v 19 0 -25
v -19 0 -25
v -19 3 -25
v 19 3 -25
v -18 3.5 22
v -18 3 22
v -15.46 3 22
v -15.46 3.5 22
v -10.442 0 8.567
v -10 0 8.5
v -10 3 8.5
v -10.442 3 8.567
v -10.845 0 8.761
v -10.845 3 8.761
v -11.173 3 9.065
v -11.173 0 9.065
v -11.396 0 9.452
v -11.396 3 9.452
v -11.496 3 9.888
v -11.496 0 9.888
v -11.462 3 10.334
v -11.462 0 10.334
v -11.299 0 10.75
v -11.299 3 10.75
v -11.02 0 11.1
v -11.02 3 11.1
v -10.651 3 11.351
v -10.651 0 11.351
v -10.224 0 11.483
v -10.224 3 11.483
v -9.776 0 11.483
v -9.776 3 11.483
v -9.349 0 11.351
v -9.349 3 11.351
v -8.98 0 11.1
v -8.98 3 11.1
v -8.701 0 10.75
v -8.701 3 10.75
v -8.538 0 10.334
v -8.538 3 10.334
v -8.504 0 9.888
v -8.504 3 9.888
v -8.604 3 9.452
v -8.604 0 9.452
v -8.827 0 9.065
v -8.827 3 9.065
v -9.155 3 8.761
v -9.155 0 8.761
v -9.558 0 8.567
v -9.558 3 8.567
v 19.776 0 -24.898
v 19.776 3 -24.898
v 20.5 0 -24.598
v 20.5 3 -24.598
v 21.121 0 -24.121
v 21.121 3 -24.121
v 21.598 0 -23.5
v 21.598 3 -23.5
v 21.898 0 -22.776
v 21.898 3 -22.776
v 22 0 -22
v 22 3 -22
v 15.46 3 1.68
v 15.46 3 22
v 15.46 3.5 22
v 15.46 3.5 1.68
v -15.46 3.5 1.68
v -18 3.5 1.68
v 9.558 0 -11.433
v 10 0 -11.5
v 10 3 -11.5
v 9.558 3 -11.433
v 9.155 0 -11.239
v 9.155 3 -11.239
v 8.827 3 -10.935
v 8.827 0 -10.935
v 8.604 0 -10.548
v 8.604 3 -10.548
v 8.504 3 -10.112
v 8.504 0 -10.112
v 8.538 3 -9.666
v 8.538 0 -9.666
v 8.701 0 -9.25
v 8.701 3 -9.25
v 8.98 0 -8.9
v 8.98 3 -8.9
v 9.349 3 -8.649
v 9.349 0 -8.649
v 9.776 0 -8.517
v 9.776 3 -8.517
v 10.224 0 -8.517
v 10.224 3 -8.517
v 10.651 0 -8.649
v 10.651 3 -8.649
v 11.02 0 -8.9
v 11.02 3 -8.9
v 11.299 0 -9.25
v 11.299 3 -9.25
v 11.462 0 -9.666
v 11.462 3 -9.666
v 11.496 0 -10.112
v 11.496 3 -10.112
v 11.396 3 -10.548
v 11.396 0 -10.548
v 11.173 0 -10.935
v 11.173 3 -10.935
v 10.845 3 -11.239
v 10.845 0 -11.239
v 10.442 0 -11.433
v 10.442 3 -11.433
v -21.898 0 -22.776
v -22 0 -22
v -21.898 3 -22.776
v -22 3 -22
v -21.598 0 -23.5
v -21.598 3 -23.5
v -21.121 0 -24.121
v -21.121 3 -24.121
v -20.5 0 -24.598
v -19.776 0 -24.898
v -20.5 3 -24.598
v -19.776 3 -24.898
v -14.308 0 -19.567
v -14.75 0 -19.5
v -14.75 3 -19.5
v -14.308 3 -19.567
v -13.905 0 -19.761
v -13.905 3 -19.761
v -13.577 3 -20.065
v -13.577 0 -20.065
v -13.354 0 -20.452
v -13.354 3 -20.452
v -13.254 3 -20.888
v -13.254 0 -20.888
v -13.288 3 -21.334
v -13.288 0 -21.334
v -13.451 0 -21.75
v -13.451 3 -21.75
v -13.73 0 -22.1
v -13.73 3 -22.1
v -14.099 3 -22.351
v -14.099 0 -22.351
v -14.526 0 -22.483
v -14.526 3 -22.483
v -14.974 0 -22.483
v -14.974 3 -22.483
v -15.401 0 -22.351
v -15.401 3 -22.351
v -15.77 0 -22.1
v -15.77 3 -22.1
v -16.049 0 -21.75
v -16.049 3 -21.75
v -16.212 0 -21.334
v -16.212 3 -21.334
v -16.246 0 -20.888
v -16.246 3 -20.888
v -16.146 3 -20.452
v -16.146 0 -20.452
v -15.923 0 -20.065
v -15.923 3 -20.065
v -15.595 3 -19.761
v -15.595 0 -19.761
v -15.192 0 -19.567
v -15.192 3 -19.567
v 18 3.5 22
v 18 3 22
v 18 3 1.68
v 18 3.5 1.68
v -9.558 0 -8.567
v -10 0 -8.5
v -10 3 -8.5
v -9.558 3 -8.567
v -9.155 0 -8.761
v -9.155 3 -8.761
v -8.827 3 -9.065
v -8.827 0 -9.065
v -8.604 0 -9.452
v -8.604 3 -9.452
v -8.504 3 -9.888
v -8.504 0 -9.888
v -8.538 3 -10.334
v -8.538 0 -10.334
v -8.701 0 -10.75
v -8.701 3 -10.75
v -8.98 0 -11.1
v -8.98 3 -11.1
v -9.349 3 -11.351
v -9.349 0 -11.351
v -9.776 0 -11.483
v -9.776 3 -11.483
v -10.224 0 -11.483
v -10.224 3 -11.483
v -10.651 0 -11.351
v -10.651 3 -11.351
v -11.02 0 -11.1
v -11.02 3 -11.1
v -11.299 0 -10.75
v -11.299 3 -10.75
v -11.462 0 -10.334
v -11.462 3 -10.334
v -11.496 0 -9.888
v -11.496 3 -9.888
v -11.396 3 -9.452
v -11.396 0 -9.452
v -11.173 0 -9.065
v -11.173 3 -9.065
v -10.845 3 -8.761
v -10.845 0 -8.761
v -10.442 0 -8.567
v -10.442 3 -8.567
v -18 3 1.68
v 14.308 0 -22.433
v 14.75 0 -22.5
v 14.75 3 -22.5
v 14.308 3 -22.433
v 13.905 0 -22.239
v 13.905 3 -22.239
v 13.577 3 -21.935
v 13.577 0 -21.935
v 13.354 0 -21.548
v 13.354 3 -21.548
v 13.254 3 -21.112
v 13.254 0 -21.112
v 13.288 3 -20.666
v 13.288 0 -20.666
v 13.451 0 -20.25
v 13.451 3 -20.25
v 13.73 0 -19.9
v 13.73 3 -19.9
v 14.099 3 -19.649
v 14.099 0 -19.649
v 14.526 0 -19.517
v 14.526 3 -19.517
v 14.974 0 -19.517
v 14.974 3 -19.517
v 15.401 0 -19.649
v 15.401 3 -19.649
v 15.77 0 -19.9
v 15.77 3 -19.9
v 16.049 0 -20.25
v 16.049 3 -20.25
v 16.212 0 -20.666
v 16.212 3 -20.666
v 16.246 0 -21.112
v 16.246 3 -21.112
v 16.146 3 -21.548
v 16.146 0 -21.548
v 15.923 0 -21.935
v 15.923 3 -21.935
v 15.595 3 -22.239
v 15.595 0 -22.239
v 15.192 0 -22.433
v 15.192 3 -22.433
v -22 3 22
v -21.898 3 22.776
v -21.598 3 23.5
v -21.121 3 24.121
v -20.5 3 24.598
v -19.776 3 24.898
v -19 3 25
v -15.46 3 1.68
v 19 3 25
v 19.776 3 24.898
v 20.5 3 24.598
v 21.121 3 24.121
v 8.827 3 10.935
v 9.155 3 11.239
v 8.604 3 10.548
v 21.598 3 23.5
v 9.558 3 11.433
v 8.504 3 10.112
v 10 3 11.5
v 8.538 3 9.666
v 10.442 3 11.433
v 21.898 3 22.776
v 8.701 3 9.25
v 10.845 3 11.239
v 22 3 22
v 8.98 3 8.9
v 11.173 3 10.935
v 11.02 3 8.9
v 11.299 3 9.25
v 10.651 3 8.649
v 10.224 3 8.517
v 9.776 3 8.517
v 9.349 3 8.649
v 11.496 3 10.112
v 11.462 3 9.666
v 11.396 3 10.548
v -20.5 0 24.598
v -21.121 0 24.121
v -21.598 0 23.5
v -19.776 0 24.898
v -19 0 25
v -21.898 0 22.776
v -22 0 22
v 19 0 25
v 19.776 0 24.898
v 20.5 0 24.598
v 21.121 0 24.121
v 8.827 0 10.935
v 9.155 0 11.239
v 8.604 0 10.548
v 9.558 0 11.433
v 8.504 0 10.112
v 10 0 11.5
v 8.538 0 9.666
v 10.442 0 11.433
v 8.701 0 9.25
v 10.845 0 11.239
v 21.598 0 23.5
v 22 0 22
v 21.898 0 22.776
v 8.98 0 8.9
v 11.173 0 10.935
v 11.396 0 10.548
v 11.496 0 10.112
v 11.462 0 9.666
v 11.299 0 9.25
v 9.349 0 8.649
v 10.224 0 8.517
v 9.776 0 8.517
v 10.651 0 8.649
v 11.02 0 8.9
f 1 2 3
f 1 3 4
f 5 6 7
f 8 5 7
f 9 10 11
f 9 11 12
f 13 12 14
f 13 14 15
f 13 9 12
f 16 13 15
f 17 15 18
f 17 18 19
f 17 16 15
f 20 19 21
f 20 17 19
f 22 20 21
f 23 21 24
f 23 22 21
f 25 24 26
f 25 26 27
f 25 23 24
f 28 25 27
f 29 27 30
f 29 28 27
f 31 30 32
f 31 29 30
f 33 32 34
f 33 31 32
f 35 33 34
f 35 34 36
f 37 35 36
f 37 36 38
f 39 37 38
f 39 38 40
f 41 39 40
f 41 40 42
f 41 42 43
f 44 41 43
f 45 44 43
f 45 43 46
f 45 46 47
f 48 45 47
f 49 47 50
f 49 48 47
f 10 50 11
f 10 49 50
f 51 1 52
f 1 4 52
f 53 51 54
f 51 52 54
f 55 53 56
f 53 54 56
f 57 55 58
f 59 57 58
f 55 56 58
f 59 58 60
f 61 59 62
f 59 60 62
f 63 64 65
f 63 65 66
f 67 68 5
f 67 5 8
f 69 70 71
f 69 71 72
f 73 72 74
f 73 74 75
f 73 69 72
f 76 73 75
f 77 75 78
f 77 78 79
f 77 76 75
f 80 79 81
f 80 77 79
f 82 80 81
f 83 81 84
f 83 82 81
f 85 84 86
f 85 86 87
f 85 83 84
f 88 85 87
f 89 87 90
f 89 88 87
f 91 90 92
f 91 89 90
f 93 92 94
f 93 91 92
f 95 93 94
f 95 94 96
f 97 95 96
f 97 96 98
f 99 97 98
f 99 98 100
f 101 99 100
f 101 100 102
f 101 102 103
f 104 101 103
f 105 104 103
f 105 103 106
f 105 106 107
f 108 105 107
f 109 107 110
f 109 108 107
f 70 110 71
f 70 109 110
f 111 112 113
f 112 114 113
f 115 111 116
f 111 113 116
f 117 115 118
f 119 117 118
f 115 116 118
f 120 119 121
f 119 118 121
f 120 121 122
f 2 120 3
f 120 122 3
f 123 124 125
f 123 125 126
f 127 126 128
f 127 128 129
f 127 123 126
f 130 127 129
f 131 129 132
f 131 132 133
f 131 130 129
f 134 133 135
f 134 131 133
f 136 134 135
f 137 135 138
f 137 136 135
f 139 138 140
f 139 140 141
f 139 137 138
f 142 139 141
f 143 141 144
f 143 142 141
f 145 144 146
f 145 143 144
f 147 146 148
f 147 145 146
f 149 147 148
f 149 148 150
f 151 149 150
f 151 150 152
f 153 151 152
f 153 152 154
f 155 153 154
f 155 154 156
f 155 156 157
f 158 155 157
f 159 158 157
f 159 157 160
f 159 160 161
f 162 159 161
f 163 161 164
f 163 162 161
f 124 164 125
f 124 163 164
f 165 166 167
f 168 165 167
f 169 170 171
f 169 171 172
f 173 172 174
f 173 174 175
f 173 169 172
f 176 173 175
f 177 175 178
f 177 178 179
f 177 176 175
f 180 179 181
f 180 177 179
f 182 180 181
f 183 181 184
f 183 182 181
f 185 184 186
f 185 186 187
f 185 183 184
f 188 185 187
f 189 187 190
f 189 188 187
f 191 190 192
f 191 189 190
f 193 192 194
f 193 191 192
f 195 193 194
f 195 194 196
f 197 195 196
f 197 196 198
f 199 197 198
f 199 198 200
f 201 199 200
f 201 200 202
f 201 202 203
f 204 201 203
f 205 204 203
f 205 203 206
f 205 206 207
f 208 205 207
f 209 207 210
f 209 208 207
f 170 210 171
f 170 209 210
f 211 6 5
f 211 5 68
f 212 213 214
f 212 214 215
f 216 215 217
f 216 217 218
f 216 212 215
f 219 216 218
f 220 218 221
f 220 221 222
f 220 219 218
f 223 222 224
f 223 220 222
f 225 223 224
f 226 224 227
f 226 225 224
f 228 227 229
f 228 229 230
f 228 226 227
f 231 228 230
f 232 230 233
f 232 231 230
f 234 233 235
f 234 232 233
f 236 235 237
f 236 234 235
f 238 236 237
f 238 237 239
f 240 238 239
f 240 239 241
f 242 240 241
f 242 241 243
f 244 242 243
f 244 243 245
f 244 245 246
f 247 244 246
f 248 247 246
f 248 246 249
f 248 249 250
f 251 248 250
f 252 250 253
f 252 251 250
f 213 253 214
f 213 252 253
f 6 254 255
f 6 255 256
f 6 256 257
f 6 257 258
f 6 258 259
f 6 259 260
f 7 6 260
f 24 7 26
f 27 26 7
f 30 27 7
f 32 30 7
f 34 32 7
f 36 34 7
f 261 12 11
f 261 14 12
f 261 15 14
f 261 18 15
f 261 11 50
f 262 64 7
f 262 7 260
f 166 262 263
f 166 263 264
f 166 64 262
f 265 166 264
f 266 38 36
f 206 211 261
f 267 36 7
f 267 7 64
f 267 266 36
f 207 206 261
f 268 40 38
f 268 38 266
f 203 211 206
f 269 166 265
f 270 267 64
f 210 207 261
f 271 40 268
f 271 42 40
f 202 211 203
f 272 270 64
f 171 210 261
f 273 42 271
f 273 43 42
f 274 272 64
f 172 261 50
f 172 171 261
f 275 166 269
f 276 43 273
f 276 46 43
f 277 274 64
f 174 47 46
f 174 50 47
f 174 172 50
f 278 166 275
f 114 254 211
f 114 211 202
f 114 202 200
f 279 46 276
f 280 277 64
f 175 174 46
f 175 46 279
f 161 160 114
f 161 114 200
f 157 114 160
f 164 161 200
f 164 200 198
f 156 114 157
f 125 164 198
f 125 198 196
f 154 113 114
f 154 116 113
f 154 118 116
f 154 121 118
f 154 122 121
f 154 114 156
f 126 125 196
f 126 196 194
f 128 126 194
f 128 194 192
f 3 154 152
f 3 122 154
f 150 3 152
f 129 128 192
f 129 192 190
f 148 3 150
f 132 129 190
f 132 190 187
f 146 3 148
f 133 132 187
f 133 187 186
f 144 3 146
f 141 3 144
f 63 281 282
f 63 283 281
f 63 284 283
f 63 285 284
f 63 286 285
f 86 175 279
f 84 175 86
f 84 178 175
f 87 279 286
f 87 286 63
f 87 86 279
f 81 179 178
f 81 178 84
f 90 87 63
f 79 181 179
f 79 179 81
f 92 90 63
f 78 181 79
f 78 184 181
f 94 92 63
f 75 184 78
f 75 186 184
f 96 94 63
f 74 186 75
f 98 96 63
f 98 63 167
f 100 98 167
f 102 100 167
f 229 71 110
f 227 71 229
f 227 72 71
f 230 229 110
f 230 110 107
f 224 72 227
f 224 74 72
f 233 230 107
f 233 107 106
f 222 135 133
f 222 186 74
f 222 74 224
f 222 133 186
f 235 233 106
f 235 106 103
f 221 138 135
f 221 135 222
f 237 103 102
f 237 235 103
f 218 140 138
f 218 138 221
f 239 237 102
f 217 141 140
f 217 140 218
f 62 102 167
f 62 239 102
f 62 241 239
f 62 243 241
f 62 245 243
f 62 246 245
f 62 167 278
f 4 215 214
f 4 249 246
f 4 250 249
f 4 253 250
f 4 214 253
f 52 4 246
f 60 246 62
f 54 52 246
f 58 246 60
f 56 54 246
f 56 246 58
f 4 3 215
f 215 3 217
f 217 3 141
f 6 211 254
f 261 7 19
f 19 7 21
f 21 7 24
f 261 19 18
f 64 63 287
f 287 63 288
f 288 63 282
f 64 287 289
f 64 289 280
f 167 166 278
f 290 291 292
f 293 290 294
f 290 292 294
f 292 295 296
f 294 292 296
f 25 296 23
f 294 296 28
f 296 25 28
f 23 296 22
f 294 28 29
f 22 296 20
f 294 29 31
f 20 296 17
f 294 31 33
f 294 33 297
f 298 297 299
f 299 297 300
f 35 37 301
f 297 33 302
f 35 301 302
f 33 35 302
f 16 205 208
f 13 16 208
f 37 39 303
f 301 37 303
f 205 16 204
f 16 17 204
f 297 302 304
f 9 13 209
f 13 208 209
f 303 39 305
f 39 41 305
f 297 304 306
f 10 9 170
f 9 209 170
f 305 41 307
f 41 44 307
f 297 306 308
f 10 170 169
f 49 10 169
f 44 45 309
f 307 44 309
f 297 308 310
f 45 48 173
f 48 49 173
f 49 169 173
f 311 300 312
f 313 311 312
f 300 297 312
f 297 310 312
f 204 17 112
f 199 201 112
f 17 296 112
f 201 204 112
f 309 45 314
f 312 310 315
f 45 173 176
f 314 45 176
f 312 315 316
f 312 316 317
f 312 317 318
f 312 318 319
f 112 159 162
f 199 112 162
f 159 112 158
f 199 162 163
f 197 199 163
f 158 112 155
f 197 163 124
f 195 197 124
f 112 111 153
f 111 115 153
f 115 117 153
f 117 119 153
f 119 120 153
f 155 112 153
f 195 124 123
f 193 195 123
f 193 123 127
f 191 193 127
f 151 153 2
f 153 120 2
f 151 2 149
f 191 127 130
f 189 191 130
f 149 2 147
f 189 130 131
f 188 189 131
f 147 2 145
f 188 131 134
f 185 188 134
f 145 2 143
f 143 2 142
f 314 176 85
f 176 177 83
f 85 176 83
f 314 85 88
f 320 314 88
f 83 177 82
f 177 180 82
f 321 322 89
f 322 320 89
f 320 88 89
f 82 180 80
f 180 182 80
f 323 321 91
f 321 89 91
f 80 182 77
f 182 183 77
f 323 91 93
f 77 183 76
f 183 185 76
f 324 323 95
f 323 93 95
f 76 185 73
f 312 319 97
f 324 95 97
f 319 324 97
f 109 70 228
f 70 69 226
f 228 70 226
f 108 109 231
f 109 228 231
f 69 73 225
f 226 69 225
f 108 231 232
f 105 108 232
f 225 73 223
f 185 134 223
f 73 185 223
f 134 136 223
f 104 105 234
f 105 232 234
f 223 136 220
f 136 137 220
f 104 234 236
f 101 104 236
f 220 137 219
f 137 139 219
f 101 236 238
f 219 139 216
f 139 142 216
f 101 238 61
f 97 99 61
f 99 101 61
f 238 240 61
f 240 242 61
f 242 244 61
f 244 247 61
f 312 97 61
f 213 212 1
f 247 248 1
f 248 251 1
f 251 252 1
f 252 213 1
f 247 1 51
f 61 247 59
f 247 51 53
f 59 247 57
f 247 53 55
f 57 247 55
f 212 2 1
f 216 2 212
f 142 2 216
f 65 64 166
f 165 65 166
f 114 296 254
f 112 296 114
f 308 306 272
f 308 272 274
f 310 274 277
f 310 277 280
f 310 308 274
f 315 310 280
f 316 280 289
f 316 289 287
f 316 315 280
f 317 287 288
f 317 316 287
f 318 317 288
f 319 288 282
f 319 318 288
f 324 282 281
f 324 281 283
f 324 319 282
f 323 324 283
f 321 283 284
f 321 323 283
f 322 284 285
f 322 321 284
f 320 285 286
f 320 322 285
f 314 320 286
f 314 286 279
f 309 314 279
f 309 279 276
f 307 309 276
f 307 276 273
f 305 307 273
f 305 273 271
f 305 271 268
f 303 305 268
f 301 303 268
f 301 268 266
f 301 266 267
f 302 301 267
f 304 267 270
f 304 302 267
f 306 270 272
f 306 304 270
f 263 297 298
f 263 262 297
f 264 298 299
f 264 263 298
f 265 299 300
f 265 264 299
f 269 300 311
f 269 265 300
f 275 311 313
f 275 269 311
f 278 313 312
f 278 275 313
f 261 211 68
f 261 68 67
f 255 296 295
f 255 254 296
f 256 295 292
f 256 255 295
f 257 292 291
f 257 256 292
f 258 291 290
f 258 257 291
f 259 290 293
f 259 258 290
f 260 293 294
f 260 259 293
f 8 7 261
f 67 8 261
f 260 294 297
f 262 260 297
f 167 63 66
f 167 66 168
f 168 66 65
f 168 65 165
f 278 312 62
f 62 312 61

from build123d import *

# Parameters (mm, degrees)
SKETCH_1_W      = 44
SKETCH_1_H      = 50
SKETCH_1_R      = 1.5
EXTRUDE_1_DEPTH = 3
FILLET_1_R      = 3
SKETCH_2_W      = 2.54
SKETCH_2_H      = 20.32
EXTRUDE_2_DEPTH = 0.5


with BuildPart() as part:
    # 草图1 → 凸台-拉伸1 (new body)
    with BuildSketch(Plane(origin=(0, 0, 0), x_dir=(1, 0, 0), z_dir=(0, 1, 0))):
        Rectangle(SKETCH_1_W, SKETCH_1_H)
        with Locations(Location((-10, 10, 0), (0, 0, 270))):
            Circle(SKETCH_1_R, mode=Mode.SUBTRACT)
        with Locations(Location((10, 10, 0), (0, 0, 90))):
            Circle(SKETCH_1_R, mode=Mode.SUBTRACT)
        with Locations(Location((10, -10, 0), (0, 0, 270))):
            Circle(SKETCH_1_R, mode=Mode.SUBTRACT)
        with Locations(Location((-10, -10, 0), (0, 0, 90))):
            Circle(SKETCH_1_R, mode=Mode.SUBTRACT)
        with Locations(Location((-14.75, 21, 0), (0, 0, 270))):
            Circle(SKETCH_1_R, mode=Mode.SUBTRACT)
        with Locations(Location((14.75, 21, 0), (0, 0, 90))):
            Circle(SKETCH_1_R, mode=Mode.SUBTRACT)
    extrude(amount=EXTRUDE_1_DEPTH)

    # 圆角1
    fillet_1_edges = [part.edges().sort_by_distance(p)[0] for p in [
        (22, 1.5, 25),
        (-22, 1.5, 25),
        (-22, 1.5, -25),
        (22, 1.5, -25),
    ]]
    fillet(fillet_1_edges, radius=FILLET_1_R)

    # 草图2 → 凸台-拉伸2 (add)
    with BuildSketch(Plane(origin=(0, 3, 0), x_dir=(1, 0, 0), z_dir=(0, 1, 0))):
        with Locations((-16.73, -11.84)):
            Rectangle(SKETCH_2_W, SKETCH_2_H)
        with Locations((16.73, -11.84)):
            Rectangle(SKETCH_2_W, SKETCH_2_H)
    extrude(amount=EXTRUDE_2_DEPTH)


solid = part.part
